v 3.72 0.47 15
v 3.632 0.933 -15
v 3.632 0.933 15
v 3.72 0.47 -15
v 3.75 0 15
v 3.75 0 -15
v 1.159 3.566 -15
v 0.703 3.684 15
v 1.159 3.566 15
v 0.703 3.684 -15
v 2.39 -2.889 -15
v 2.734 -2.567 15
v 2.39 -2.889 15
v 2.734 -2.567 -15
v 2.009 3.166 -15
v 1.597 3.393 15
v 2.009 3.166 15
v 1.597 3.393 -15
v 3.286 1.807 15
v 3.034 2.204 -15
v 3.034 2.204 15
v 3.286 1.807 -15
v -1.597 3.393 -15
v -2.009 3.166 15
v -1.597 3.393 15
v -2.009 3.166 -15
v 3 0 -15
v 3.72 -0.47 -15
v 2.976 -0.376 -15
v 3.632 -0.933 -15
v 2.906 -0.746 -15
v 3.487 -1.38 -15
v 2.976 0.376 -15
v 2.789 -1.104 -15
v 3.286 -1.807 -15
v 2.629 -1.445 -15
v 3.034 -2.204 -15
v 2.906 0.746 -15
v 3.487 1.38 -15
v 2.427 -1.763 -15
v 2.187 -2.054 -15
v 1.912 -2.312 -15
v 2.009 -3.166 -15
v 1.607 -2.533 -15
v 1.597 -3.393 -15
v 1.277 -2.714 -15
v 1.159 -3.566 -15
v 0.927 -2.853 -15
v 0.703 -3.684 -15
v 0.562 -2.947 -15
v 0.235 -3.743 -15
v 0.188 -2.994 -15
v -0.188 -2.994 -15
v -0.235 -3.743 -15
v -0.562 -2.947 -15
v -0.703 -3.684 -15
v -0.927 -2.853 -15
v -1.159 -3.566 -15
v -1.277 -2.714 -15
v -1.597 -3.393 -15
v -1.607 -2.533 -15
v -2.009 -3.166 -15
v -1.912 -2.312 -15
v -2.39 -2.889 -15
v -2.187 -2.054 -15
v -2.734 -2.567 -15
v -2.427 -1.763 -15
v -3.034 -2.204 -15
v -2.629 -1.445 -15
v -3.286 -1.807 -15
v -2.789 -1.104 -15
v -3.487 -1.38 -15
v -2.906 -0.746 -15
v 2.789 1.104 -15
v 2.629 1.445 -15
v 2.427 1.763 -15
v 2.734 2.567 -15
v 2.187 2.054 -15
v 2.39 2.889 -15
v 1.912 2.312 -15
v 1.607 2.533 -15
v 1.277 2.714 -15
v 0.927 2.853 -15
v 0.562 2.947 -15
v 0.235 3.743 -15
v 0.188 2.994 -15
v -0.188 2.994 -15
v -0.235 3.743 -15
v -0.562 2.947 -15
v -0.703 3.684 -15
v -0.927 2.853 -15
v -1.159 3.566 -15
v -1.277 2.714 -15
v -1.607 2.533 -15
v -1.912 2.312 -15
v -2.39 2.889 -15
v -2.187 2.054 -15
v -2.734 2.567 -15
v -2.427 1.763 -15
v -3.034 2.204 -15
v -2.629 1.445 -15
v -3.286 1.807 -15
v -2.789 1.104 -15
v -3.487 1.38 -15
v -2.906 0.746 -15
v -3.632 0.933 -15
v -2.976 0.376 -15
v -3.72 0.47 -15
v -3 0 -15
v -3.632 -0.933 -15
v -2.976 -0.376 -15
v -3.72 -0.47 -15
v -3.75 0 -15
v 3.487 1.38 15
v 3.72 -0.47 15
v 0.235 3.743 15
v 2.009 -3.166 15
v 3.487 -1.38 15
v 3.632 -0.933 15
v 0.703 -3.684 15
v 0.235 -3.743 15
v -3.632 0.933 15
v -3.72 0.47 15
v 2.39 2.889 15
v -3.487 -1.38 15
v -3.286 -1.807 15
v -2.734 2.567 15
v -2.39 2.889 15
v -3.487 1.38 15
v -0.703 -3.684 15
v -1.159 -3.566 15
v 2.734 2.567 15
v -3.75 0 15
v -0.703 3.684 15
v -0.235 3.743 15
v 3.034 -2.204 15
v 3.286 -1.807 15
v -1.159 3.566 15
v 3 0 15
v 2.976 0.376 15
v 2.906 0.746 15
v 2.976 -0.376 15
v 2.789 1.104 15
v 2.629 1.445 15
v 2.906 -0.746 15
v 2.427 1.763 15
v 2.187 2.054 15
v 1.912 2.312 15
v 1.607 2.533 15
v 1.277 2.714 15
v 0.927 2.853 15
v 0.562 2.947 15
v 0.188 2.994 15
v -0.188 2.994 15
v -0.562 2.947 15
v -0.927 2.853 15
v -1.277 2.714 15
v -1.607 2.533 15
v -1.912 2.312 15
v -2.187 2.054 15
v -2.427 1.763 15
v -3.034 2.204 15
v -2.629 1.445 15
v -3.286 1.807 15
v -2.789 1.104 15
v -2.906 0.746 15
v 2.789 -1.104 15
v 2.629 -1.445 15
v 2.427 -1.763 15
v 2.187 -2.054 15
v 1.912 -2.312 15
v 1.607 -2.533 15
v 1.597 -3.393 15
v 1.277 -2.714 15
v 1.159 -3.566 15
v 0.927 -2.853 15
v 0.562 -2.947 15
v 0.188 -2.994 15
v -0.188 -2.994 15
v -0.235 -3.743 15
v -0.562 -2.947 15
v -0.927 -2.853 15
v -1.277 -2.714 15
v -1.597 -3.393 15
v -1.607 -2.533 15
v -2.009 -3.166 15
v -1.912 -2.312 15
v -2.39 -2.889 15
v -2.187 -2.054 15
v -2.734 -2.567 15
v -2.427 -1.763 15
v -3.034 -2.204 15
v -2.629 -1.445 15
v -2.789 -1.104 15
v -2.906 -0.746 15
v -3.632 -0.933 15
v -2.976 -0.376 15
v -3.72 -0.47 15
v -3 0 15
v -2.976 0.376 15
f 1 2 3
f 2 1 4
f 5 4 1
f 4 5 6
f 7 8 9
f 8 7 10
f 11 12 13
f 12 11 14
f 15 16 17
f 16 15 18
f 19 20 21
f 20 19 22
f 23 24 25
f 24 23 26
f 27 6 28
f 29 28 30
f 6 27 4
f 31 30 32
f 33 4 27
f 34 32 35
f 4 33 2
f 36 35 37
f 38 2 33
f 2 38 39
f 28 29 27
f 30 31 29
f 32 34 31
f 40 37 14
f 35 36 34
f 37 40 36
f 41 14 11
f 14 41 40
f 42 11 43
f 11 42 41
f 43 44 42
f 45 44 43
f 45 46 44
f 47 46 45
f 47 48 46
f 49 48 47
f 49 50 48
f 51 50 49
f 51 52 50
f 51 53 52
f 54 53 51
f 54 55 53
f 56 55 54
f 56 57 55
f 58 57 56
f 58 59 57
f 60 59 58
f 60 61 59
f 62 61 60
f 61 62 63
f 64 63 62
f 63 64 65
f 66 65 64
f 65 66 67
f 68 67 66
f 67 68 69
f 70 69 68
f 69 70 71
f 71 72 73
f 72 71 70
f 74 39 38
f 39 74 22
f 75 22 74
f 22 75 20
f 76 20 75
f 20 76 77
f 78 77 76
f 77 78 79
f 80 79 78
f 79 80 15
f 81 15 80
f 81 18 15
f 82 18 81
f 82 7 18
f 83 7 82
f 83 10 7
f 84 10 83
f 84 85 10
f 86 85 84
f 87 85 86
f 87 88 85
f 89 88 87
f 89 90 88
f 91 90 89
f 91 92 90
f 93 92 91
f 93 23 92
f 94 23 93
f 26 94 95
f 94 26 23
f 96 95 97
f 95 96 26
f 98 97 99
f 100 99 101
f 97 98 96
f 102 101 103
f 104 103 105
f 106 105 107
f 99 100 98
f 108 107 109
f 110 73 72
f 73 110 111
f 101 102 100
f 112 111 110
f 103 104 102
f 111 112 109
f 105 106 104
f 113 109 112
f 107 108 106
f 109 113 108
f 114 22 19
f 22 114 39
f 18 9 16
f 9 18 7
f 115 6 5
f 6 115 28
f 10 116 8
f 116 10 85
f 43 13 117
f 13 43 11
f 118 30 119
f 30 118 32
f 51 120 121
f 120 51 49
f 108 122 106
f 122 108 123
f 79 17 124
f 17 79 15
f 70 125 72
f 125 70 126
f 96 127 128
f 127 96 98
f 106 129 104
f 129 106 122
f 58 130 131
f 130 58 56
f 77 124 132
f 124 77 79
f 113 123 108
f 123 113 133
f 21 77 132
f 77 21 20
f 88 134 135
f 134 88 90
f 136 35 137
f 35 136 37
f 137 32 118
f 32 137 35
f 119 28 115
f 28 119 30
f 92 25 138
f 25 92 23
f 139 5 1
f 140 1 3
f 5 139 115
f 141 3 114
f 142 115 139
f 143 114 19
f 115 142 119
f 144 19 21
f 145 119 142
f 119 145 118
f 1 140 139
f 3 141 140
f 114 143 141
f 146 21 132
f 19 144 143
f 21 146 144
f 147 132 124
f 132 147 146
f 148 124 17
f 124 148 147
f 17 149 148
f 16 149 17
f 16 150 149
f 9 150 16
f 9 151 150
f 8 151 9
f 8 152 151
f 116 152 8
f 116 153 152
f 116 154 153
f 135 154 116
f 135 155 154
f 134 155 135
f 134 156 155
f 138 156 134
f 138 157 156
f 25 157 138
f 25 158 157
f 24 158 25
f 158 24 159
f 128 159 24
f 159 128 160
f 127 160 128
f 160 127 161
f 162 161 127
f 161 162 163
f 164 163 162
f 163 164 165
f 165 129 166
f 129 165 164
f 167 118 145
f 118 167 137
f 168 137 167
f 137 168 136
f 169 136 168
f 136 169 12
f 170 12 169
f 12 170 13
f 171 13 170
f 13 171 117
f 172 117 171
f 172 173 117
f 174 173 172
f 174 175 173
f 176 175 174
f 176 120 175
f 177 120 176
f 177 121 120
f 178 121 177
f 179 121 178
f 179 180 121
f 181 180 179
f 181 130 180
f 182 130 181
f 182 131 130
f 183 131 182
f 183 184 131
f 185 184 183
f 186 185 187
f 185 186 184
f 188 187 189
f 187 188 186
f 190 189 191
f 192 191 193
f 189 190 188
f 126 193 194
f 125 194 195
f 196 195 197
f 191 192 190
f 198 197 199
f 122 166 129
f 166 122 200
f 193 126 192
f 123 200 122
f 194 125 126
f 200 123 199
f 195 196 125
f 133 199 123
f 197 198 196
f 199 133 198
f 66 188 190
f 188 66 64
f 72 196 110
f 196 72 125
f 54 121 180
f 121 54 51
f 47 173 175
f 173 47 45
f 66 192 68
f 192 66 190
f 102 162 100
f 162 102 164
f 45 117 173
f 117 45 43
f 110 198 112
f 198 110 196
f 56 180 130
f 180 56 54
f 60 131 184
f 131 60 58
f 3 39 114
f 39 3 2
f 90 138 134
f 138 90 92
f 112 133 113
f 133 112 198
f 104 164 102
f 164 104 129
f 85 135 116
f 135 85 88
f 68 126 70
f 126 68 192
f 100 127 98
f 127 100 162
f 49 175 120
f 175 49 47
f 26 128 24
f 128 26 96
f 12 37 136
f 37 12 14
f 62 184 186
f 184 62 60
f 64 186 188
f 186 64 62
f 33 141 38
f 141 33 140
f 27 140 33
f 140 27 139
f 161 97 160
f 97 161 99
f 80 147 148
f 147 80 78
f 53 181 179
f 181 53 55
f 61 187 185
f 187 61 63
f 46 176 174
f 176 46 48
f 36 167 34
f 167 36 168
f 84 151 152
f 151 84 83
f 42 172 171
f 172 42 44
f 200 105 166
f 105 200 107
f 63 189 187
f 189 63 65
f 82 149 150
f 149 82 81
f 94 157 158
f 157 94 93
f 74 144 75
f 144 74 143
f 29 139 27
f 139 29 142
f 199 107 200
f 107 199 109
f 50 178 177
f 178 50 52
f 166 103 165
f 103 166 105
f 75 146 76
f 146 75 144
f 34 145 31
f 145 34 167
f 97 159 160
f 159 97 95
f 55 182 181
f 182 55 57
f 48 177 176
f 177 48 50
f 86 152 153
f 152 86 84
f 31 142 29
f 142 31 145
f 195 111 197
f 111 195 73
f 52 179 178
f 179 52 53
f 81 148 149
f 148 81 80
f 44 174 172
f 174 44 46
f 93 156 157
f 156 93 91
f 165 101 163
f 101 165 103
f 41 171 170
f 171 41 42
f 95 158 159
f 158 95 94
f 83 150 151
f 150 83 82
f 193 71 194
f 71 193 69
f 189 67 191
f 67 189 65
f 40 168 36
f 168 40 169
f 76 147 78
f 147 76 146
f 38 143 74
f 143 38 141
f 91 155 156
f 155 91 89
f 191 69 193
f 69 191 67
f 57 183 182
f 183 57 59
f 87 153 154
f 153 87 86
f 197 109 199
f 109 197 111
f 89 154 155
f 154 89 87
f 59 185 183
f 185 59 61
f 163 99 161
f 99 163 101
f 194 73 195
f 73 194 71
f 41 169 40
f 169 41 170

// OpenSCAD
$fn = 50;


difference() {
	union() {
		translate(v = [0, 0, -15.0000000000]) {
			cylinder(h = 30, r = 3.7500000000);
		}
	}
	union() {
		translate(v = [0, 0, -100.0000000000]) {
			cylinder(h = 200, r = 3.0000000000);
		}
	}
}
